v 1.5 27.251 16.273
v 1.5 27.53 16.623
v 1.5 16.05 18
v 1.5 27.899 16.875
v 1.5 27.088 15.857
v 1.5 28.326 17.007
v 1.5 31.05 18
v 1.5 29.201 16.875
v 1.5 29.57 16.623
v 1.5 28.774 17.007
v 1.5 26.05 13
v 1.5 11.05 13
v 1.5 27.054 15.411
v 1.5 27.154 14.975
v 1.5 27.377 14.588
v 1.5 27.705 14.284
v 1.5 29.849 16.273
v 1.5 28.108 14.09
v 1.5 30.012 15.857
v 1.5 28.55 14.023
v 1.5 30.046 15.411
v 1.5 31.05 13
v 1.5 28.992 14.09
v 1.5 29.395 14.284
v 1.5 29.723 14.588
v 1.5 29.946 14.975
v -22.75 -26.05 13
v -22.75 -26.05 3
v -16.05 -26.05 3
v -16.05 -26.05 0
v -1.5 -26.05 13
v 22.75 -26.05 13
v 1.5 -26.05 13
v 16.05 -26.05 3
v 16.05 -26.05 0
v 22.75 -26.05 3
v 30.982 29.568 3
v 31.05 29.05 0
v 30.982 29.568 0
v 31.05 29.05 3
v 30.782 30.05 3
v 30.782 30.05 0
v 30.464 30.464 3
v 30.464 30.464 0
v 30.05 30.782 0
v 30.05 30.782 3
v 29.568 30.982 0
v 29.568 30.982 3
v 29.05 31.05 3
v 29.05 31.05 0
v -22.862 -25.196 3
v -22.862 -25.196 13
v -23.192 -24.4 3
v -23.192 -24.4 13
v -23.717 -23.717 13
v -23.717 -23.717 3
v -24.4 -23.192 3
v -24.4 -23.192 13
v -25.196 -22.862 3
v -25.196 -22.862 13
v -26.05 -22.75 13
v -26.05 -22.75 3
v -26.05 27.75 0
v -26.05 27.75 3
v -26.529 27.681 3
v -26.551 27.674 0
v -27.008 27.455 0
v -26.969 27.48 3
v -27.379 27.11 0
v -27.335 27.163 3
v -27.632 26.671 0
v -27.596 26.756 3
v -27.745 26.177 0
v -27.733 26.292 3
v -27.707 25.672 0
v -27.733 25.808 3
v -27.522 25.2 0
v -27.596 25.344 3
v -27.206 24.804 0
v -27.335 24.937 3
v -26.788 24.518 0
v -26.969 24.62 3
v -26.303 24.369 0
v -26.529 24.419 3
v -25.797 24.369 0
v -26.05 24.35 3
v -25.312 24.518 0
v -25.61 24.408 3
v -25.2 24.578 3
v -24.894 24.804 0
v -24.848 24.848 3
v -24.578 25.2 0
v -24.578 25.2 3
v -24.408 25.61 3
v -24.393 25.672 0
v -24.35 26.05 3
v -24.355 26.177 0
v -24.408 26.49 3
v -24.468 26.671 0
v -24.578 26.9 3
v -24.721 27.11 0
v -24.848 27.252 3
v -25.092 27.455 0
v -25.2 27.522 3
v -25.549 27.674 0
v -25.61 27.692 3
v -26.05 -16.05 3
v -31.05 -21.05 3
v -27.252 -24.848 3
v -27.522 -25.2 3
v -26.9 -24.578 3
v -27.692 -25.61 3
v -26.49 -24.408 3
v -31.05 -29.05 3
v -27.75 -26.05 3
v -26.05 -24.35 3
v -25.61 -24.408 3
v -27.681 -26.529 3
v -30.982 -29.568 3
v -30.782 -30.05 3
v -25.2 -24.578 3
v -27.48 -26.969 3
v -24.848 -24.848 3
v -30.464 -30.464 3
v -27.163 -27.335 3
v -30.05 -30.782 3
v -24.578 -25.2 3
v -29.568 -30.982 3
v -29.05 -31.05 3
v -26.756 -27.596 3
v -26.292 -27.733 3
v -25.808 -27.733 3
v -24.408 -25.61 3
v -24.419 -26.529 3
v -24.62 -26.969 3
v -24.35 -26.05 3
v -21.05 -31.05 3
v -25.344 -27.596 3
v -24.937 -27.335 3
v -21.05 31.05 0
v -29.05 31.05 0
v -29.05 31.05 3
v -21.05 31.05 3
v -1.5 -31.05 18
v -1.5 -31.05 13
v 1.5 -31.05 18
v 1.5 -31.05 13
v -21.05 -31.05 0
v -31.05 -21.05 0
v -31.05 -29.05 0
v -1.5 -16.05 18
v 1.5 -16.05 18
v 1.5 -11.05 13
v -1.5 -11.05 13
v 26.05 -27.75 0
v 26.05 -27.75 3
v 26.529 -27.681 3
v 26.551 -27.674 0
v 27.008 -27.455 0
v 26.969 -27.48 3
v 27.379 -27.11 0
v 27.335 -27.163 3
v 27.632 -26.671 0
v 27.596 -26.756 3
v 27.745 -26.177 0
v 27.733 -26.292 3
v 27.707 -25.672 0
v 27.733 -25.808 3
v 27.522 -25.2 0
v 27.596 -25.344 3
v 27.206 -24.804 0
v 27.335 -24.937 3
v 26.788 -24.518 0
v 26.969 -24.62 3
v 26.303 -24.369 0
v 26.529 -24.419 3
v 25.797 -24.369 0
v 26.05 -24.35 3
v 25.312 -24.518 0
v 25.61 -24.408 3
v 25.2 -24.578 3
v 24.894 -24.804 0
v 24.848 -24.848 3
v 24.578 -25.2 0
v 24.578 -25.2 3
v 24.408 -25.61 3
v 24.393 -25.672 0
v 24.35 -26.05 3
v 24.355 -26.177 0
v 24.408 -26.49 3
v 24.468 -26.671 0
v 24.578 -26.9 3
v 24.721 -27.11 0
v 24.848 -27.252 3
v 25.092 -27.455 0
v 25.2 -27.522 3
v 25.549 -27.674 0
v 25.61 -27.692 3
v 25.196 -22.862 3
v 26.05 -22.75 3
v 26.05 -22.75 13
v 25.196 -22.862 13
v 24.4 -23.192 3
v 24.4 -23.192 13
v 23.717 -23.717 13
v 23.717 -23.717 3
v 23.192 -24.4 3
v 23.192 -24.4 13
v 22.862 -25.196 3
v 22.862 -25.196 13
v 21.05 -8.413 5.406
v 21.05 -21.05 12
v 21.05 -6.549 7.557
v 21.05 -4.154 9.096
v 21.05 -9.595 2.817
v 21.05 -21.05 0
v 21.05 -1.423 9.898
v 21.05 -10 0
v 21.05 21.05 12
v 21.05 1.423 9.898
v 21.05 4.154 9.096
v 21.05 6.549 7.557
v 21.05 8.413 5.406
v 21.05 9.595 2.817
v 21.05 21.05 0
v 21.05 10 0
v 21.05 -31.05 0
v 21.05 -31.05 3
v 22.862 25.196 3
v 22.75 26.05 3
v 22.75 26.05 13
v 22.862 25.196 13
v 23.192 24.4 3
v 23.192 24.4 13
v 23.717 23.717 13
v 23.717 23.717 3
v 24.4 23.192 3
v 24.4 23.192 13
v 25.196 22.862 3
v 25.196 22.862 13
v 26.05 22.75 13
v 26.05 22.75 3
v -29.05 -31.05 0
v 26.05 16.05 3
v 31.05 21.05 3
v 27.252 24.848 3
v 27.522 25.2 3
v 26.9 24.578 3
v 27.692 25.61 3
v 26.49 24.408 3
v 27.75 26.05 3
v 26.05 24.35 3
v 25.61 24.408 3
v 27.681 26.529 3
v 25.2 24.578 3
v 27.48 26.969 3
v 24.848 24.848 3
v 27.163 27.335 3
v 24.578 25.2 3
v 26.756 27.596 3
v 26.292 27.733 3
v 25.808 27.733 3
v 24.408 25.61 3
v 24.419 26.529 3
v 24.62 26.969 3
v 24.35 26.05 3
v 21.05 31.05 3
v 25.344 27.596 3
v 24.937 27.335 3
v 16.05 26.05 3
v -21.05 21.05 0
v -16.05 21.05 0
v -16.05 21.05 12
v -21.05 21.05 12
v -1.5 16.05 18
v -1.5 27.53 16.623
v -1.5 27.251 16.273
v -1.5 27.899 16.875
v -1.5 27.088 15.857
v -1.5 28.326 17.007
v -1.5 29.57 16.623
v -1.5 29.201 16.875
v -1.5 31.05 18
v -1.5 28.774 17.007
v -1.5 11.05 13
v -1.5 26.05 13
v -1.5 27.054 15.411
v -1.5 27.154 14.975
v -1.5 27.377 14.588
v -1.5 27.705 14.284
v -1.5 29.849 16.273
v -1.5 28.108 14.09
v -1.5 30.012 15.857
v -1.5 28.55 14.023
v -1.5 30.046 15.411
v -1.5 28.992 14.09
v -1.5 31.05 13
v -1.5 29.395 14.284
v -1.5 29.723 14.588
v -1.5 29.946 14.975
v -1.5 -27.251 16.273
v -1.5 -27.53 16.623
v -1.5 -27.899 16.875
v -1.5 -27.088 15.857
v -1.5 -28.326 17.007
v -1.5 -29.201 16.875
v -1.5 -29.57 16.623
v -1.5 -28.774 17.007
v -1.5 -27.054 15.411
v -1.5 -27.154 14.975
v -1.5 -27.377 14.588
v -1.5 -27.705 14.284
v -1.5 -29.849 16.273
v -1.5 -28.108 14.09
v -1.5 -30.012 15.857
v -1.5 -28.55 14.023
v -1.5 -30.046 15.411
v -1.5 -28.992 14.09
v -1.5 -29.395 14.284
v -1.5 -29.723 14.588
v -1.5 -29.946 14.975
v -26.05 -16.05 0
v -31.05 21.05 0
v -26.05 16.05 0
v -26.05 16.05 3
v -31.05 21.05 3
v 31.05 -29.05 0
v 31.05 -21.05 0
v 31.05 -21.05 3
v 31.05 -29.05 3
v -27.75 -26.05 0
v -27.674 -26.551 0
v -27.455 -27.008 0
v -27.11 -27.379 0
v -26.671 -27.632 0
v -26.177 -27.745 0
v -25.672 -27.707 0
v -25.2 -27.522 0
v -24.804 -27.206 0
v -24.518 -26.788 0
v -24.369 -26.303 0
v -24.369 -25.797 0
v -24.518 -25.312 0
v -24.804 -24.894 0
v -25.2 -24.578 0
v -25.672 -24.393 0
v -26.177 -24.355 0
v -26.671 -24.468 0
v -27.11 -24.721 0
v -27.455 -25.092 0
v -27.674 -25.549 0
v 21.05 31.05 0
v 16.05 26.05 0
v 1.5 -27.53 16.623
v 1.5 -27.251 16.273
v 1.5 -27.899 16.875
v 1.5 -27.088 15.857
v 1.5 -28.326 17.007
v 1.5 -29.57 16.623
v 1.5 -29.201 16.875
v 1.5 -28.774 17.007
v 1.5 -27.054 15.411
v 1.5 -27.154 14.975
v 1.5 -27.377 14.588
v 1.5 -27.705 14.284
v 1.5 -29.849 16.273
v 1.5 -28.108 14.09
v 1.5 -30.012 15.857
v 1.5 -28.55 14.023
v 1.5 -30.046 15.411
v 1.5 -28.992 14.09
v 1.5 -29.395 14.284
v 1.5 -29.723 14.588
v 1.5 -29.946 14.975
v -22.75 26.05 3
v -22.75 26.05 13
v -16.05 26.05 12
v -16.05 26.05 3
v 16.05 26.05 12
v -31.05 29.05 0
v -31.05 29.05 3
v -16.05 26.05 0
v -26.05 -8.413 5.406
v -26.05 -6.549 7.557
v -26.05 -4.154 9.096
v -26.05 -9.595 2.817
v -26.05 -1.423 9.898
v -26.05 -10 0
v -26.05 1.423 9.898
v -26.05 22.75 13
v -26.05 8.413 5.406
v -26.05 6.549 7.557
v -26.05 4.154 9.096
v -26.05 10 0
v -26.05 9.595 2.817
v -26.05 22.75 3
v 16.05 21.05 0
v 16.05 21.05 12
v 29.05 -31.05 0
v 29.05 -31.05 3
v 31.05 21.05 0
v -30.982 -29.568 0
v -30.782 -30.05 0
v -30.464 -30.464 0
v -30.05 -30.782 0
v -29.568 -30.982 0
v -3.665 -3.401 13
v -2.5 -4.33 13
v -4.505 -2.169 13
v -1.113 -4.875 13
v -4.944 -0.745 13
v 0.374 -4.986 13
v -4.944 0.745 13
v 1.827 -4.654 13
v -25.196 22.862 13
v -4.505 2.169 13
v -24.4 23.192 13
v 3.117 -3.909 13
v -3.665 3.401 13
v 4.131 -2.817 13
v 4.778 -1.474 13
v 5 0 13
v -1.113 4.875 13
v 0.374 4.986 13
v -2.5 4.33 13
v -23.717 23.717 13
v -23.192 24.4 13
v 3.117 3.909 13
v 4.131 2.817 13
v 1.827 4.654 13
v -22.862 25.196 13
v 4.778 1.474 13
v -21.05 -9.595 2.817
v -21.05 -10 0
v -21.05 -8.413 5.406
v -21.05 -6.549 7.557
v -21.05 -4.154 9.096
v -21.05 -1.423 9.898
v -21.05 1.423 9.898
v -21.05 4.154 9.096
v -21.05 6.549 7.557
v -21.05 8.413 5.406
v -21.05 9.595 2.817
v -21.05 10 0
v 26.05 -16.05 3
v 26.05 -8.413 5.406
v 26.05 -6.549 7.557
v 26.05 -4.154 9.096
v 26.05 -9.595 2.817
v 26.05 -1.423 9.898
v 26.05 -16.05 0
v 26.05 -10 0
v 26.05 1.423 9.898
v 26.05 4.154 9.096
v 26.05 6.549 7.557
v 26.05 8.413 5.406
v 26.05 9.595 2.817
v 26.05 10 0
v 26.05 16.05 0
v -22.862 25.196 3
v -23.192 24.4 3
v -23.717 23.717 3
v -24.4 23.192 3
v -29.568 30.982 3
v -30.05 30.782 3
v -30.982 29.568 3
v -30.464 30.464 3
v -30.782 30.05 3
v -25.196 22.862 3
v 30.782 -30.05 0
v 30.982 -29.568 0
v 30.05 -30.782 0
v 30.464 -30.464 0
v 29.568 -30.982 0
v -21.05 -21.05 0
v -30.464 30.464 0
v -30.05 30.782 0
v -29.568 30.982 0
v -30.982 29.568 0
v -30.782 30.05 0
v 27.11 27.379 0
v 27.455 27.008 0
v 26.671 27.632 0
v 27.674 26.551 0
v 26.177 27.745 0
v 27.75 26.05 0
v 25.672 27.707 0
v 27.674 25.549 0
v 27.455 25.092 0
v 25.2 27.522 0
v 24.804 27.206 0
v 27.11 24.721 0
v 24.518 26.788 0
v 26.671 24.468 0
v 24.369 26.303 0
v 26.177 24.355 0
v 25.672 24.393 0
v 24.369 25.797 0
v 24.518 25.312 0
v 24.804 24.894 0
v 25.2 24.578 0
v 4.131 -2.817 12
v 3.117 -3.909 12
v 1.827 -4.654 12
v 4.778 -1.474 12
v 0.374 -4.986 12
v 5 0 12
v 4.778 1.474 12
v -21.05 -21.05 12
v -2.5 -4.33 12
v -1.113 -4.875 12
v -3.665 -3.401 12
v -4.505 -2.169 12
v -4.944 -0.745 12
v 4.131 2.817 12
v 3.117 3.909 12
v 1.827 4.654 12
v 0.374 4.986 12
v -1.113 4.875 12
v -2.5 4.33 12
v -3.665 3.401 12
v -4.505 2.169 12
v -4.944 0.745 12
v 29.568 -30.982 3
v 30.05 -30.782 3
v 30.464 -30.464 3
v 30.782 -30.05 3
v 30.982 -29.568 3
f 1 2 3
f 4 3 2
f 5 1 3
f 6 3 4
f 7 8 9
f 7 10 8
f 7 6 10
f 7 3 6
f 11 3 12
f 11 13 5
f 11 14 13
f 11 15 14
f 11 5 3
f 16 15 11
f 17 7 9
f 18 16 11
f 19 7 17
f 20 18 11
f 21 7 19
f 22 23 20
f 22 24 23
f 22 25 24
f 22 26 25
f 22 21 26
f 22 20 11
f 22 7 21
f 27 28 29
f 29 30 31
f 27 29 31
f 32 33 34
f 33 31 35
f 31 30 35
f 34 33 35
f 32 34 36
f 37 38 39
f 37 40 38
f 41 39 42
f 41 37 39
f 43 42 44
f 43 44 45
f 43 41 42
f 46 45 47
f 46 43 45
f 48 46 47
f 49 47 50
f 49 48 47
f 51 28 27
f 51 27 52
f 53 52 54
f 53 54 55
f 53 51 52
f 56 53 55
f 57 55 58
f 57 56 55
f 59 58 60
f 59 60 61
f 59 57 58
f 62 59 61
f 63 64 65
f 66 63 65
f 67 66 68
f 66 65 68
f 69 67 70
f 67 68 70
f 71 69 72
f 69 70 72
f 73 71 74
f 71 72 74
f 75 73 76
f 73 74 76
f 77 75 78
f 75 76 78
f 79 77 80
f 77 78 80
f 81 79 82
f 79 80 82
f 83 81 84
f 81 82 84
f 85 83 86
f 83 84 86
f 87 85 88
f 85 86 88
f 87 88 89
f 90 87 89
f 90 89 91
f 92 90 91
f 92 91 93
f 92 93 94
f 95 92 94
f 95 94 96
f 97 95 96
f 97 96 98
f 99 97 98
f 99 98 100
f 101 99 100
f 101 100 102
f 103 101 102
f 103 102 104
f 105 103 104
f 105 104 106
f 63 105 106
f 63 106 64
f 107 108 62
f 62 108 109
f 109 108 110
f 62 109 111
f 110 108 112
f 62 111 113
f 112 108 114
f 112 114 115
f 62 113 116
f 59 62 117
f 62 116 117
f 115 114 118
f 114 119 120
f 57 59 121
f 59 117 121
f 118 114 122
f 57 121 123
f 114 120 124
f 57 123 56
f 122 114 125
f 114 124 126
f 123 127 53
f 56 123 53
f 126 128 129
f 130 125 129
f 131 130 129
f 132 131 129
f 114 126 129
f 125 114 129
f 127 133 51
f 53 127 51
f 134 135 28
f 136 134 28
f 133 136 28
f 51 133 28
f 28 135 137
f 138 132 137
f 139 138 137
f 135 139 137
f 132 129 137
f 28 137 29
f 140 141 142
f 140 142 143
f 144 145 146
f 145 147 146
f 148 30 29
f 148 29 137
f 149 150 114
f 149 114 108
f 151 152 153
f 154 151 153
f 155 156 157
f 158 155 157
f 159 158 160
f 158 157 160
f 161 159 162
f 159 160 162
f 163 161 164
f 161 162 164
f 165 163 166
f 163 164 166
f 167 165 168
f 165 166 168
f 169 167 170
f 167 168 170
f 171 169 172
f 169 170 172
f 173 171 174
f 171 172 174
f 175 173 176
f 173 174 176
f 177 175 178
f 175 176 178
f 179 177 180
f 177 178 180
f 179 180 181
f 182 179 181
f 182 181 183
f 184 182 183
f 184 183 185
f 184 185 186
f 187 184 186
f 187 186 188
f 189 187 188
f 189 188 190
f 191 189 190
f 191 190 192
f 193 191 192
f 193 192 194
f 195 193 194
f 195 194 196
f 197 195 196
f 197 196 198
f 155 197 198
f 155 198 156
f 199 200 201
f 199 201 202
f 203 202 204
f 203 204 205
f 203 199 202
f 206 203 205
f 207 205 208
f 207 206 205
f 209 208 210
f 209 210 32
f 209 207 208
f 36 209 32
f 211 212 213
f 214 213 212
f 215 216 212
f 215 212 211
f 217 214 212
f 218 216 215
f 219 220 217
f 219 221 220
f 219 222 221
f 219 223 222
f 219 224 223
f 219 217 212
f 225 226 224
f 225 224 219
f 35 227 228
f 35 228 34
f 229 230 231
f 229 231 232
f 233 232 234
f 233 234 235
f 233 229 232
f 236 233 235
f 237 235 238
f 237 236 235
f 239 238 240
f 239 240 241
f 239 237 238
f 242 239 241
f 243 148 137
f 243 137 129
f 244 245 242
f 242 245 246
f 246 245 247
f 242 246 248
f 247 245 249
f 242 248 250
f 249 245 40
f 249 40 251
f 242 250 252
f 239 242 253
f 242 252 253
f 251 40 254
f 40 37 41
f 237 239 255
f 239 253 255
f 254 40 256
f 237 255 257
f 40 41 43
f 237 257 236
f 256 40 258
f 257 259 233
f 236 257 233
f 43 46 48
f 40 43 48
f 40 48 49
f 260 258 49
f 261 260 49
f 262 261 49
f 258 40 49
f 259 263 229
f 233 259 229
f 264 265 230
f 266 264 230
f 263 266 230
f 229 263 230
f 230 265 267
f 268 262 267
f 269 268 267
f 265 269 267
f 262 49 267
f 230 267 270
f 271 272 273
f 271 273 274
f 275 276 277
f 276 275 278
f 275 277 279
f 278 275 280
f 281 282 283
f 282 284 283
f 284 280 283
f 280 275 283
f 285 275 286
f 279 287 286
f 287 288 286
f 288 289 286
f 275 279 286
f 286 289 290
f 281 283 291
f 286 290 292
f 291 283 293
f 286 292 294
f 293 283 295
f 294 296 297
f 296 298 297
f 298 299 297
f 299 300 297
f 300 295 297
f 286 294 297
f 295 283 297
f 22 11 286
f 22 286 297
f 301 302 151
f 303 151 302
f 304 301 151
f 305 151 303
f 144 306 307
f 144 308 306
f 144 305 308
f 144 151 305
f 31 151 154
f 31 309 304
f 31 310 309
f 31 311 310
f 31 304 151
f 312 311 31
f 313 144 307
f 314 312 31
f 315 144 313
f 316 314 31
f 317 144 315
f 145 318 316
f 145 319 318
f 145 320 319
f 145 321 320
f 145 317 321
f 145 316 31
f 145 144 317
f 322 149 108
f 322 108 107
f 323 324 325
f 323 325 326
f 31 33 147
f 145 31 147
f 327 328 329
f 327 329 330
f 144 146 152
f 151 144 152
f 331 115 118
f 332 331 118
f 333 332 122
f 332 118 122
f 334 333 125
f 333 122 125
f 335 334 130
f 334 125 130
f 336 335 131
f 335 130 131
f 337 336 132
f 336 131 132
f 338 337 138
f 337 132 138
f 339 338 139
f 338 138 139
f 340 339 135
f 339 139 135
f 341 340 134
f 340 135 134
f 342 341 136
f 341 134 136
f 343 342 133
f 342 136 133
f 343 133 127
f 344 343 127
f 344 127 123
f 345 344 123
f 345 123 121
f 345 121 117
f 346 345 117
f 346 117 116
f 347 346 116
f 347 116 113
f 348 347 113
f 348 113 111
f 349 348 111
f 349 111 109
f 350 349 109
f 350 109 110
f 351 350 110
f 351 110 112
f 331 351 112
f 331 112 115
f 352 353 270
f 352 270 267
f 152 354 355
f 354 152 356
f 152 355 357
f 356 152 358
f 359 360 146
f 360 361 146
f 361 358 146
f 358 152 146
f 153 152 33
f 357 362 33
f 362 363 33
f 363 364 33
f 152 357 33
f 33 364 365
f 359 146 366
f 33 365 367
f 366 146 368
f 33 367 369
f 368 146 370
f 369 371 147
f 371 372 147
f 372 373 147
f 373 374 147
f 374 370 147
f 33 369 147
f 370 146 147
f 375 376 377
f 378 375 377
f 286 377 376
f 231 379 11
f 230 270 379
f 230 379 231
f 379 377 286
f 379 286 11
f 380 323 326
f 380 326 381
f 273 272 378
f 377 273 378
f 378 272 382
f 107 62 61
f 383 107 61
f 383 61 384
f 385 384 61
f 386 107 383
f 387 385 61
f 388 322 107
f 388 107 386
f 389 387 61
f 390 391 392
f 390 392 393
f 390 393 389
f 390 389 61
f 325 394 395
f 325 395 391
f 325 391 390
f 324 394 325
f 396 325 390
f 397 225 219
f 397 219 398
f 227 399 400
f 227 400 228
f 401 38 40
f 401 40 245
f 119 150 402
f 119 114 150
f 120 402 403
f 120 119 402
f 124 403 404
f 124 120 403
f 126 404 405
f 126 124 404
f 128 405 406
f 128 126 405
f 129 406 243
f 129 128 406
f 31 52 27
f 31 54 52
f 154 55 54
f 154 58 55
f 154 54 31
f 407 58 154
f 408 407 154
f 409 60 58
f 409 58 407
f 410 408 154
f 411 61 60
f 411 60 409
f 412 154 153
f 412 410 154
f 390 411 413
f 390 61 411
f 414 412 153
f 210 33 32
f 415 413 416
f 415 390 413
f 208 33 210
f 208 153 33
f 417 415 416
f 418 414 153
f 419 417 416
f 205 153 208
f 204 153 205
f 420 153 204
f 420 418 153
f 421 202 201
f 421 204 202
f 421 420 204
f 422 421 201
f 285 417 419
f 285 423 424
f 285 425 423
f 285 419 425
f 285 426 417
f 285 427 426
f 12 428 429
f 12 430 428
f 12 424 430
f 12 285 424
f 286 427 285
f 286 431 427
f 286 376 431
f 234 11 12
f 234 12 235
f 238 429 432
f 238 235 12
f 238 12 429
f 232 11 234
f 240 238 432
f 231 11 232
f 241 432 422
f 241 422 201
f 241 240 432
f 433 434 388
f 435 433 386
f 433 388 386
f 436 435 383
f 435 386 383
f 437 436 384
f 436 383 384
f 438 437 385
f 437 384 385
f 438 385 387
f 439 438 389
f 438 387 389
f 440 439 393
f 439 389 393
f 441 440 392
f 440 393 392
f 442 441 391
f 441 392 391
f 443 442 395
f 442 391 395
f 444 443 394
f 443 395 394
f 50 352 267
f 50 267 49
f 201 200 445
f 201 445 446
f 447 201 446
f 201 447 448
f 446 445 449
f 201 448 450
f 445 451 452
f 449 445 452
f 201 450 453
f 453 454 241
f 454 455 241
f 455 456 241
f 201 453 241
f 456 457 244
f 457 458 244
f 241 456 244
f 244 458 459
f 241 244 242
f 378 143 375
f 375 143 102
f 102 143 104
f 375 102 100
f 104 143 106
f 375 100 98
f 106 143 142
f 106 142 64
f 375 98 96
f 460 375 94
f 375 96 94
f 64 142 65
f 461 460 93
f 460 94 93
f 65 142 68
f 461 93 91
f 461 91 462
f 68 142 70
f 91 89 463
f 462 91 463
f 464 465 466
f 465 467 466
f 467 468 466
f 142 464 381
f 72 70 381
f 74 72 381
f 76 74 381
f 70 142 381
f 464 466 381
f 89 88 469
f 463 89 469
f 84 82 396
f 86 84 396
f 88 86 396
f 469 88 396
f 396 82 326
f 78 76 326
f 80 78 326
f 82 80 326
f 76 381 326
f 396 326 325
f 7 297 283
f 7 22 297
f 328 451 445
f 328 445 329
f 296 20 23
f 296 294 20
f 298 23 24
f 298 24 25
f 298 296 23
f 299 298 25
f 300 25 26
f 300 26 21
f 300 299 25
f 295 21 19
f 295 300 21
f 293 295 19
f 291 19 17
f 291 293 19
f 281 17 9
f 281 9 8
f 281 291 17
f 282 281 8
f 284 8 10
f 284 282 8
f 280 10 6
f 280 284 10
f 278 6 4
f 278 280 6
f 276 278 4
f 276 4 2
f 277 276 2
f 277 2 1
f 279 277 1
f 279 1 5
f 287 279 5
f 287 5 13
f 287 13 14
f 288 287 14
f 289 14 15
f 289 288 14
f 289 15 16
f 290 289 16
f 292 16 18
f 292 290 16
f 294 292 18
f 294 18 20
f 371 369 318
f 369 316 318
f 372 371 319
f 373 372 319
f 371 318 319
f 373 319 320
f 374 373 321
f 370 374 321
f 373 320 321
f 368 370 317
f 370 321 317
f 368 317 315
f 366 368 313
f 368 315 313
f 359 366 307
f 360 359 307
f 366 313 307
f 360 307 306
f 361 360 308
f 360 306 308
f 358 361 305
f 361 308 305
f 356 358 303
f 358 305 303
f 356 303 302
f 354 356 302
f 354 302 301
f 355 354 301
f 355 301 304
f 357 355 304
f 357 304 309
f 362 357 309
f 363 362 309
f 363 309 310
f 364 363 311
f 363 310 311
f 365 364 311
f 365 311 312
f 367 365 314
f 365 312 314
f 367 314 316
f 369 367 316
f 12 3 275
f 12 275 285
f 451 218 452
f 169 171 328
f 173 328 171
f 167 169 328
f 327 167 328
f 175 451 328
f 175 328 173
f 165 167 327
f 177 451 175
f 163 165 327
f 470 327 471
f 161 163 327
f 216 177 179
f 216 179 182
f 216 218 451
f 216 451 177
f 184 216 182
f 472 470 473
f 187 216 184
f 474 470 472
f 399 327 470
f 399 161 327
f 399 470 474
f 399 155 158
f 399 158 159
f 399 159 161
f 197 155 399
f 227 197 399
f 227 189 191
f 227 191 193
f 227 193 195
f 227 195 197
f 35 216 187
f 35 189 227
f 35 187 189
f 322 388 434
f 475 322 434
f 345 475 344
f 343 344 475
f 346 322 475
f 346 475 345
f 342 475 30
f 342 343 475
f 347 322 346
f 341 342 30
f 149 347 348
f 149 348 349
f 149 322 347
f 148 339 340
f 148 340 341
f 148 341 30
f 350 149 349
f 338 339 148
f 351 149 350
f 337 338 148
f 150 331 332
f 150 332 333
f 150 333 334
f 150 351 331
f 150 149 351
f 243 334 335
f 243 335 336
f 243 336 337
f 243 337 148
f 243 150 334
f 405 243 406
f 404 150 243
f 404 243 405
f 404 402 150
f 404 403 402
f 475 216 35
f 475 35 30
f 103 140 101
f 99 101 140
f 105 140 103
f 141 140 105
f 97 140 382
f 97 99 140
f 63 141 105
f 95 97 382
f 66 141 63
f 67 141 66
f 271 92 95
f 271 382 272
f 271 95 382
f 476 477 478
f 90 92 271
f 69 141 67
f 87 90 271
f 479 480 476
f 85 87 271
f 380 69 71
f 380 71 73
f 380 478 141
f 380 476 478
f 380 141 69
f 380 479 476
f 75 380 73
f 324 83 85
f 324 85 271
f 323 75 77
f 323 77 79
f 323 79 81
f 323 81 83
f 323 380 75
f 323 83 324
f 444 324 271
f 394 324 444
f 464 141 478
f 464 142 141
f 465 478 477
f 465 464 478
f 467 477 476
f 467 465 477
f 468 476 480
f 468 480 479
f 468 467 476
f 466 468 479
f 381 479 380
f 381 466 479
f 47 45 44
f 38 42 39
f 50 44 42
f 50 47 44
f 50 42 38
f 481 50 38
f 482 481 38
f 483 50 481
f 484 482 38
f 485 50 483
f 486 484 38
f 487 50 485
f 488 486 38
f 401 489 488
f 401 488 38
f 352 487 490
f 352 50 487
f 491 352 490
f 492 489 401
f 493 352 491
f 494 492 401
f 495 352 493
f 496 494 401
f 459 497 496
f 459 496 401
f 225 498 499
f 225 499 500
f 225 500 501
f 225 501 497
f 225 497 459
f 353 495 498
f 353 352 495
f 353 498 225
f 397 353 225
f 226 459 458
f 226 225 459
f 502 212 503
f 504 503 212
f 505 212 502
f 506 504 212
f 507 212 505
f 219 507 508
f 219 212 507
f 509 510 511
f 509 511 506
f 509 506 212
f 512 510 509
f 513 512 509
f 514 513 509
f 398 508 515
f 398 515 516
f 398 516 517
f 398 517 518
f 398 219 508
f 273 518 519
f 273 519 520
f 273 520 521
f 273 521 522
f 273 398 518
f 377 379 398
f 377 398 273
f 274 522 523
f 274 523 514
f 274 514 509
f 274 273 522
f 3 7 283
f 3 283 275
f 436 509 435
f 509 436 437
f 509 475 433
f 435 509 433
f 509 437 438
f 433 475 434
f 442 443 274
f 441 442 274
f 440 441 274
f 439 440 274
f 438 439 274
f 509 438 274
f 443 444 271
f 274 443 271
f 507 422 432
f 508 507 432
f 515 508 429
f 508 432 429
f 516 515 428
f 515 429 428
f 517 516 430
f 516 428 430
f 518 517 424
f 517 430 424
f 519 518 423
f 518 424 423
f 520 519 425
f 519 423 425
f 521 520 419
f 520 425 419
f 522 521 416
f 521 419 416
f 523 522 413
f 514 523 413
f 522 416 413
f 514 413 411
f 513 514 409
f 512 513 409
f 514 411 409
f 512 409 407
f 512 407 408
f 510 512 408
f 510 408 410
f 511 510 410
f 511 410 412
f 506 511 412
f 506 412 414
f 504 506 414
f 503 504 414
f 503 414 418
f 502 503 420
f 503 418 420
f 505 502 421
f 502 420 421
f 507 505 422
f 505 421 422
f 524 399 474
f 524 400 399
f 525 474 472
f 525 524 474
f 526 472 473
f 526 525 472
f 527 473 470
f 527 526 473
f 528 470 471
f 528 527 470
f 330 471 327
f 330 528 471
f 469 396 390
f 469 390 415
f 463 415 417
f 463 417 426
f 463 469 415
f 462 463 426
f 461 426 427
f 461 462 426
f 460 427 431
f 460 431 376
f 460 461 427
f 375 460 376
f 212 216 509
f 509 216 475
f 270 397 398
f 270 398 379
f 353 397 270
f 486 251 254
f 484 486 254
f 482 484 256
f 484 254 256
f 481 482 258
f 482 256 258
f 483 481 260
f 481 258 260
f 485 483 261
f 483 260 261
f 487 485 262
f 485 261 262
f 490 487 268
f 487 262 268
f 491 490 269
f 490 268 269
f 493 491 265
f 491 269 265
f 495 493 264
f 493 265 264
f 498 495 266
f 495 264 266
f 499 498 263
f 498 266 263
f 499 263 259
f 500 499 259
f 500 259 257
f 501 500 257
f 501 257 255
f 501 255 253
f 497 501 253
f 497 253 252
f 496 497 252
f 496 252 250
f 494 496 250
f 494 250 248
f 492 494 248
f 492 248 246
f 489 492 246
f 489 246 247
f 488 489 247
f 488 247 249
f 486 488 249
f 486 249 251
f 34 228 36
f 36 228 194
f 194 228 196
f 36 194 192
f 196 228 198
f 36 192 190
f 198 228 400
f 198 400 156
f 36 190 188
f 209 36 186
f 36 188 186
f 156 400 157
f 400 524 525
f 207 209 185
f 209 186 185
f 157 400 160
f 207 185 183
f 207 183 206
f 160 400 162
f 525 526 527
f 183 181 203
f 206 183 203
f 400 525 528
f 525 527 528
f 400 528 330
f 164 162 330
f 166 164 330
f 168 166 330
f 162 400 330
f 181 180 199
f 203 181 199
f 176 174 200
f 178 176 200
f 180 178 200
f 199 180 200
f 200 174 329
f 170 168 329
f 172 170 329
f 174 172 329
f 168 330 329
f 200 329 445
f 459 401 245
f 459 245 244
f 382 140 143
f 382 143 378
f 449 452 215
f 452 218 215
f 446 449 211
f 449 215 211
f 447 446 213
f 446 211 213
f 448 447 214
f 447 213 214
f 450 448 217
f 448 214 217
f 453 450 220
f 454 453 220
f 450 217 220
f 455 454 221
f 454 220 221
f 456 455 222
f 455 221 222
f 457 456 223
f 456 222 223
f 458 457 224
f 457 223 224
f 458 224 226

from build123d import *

# Parameters (mm, degrees)
CROQUIS1_W                       = 52.1
CROQUIS1_H                       = 52.1
SALIENTE_EXTRUIR1_DEPTH          = 13
CROQUIS2_W                       = 42.1
CROQUIS2_H                       = 42.1
CORTAR_EXTRUIR1_DEPTH            = 12
SALIENTE_EXTRUIR2_DEPTH          = 3
TALADRO_DE_MARGEN_PARA_M31_D     = 3.4
TALADRO_START                    = 3
TALADRO_DE_MARGEN_PARA_M61_DEPTH = 10
REDONDEO1_R                      = 2
CROQUIS10_R                      = 5
CORTAR_EXTRUIR2_DEPTH            = 1
MATRIZC1_COUNT                   = 4
REDONDEO1_OF_MATRIZC1_R          = 2
CORTAR_EXTRUIR3_REACH            = 47.795
CROQUIS11_W                      = 32.1
CROQUIS11_H                      = 5
CORTAR_EXTRUIR4_REACH            = 68.284
CROQUIS12_R                      = 10
CROQUIS13_R                      = 1.5
SALIENTE_EXTRUIR3_DEPTH          = 1.5


# Read off the part's stored shape, not the designer's step: Taladro de margen para M61
with BuildPart() as part:
    # Croquis1 → Saliente-Extruir1 (new body)
    with BuildSketch(Plane.XY):
        Rectangle(CROQUIS1_W, CROQUIS1_H)
    extrude(amount=SALIENTE_EXTRUIR1_DEPTH)

    # Croquis2 → Cortar-Extruir1 (cut)
    with BuildSketch(Plane(origin=(0, 0, 0), x_dir=(-1, 0, 0), z_dir=(0, 0, -1))):
        Rectangle(CROQUIS2_W, CROQUIS2_H)
    extrude(amount=-CORTAR_EXTRUIR1_DEPTH, mode=Mode.SUBTRACT)

    # Croquis3 → Saliente-Extruir2 (add)
    with BuildSketch(Plane(origin=(0, 0, 0), x_dir=(-1, 0, 0), z_dir=(0, 0, -1))):
        Polygon((-31.05, 21.05), (-26.05, 16.05), (-26.05, 21.05), (-21.05, 21.05), (-21.05, 26.05), (-16.05, 26.05), (-21.05, 31.05), (-31.05, 31.05), align=None)
    saliente_extruir2 = extrude(amount=-SALIENTE_EXTRUIR2_DEPTH)

    # Taladro de margen para M31 (through all)
    with Locations(Plane(origin=(0, 0, 0), x_dir=(-1, 0, 0), z_dir=(0, 0, -1))):
        with Locations((-26.05, 26.05)):
            taladro_de_margen_para_m31 = Hole(TALADRO_DE_MARGEN_PARA_M31_D / 2)

    # Taladro de margen para M61 outline → Taladro de margen para M61 (cut)
    with BuildSketch(Plane.XY.offset(TALADRO_START)):
        with BuildLine():
            Line((24.35, 26.05), (22.75, 26.05))
            ThreePointArc((22.75, 26.05), (23.716547622, 23.716547622), (26.05, 22.75))
            Line((26.05, 22.75), (26.05, 24.35))
            ThreePointArc((26.05, 24.35), (24.847918472, 24.847918472), (24.35, 26.05))
        make_face()
    taladro_de_margen_para_m61 = extrude(amount=TALADRO_DE_MARGEN_PARA_M61_DEPTH, mode=Mode.SUBTRACT)

    # Redondeo1
    redondeo1_edges = [part.edges().sort_by_distance(p)[0] for p in [
        (31.05, 31.05, 1.5),
    ]]
    fillet(redondeo1_edges, radius=REDONDEO1_R)

    # Croquis10 → Cortar-Extruir2 (cut)
    with BuildSketch(Plane.XY.offset(13)):
        Circle(CROQUIS10_R)
    extrude(amount=-CORTAR_EXTRUIR2_DEPTH, mode=Mode.SUBTRACT)

    # MatrizC1: Saliente-Extruir2, Taladro de margen para M31, Taladro de margen para M61 ×4 about axis
    matrizc1_axis = Axis((0, 0, 0), (0, 0, 1))
    add([saliente_extruir2.rotate(matrizc1_axis, i * 360 / MATRIZC1_COUNT) for i in range(1, MATRIZC1_COUNT)])
    add([taladro_de_margen_para_m31.rotate(matrizc1_axis, i * 360 / MATRIZC1_COUNT) for i in range(1, MATRIZC1_COUNT)], mode=Mode.SUBTRACT)
    add([taladro_de_margen_para_m61.rotate(matrizc1_axis, i * 360 / MATRIZC1_COUNT) for i in range(1, MATRIZC1_COUNT)], mode=Mode.SUBTRACT)

    # Redondeo1 of MatrizC1
    redondeo1_of_matrizc1_edges = [part.edges().sort_by_distance(p)[0] for p in [
        (-31.05, 31.05, 1.5),
        (-31.05, -31.05, 1.5),
        (31.05, -31.05, 1.5),
    ]]
    fillet(redondeo1_of_matrizc1_edges, radius=REDONDEO1_OF_MATRIZC1_R)

    # Cortar-Extruir3: up to this face of the body (flat: up to its plane)
    cortar_extruir3_end = Plane(part.part.faces().sort_by_distance((20.45461609, 0, 12))[0])
    # Croquis11 → Cortar-Extruir3 (cut, up to the picked face)
    with BuildSketch(Plane(origin=(0, 0, 0), x_dir=(-1, 0, 0), z_dir=(0, 0, -1)), mode=Mode.PRIVATE) as cortar_extruir3_sk1:
        with Locations((0, 23.55)):
            Rectangle(CROQUIS11_W, CROQUIS11_H)
    cortar_extruir3_tool1 = split(extrude(cortar_extruir3_sk1.sketch, amount=-CORTAR_EXTRUIR3_REACH, mode=Mode.PRIVATE), bisect_by=cortar_extruir3_end, keep=Keep.BOTH, mode=Mode.PRIVATE)
    add(cortar_extruir3_tool1.solids().sort_by(Axis((0, 23.55, 0), (0, 0, 1)))[0], mode=Mode.SUBTRACT)

    # Cortar-Extruir4: up to this face of the body (flat: up to its plane)
    cortar_extruir4_end = Plane(part.part.faces().sort_by_distance((26.05, 0, 6.864592781))[0])
    # Croquis12 → Cortar-Extruir4 (cut, up to the picked face)
    with BuildSketch(Plane.ZY.offset(26.05), mode=Mode.PRIVATE) as cortar_extruir4_sk1:
        Circle(CROQUIS12_R)
    cortar_extruir4_tool1 = split(extrude(cortar_extruir4_sk1.sketch, amount=-CORTAR_EXTRUIR4_REACH, mode=Mode.PRIVATE), bisect_by=cortar_extruir4_end, keep=Keep.BOTH, mode=Mode.PRIVATE)
    add(cortar_extruir4_tool1.solids().sort_by(Axis((-26.05, 0, 0), (1, 0, 0)))[0], mode=Mode.SUBTRACT)

    # Croquis13 → Saliente-Extruir3 (add, symmetric)
    with BuildSketch(Plane(origin=(0, 0, 0), x_dir=(0, 0, -1), z_dir=(1, 0, 0))):
        Polygon((-13, 16.05), (-13, 31.05), (-18, 31.05), (-18, 16.05), (-13, 11.05), align=None)
        with Locations((-15.523423592, 28.55)):
            Circle(CROQUIS13_R, mode=Mode.SUBTRACT)
    saliente_extruir3 = extrude(amount=SALIENTE_EXTRUIR3_DEPTH, both=True)

    # Simetría1: Saliente-Extruir3 across plane
    add(saliente_extruir3.mirror(Plane.ZX))


solid = part.part
